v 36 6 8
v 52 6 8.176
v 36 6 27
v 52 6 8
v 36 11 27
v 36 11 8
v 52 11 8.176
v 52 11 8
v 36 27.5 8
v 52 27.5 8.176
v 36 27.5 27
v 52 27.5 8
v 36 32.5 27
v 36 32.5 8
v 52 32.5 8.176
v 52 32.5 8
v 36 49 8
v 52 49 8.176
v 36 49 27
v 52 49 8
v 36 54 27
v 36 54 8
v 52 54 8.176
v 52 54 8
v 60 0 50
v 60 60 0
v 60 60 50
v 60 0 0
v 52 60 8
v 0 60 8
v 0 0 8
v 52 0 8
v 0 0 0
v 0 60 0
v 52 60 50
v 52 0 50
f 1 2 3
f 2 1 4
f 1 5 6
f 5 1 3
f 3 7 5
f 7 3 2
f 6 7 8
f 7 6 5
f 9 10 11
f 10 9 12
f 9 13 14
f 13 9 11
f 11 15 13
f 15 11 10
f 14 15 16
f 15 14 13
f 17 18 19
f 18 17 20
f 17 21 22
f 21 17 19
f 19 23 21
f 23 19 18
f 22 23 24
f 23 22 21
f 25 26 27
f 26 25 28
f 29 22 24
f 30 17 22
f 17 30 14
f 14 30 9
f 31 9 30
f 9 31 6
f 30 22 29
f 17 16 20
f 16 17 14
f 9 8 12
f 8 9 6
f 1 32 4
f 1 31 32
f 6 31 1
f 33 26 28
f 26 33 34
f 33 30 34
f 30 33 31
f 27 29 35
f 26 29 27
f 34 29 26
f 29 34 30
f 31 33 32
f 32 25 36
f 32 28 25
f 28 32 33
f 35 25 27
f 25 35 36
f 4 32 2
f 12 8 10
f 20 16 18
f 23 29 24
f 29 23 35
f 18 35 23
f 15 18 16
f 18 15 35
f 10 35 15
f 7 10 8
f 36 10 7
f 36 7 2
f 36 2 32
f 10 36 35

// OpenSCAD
$fn = 32;

// ----------------------------------------------------------------------
// Rib bracket: 3-gusset L bracket
// ----------------------------------------------------------------------

// --- parameters (mm) ---
base_l = 60;              // foot length, X
base_w = 60;              // foot width, Y
base_t = 8;               // foot thickness
plate_t = 8;              // upright plate thickness
plate_h = 50;             // overall height
gus_l = 16;               // gusset leg along the foot
gus_h = 20;               // gusset height
gus_t = 5;                // gusset thickness
gus_edge = 6;             // gusset margin from the foot edge
n_gus = 3;                // gusset count

gus_pitch = (base_w - 2 * gus_edge - gus_t) / (n_gus - 1);  // gusset pitch

union() {
  cube([base_l, base_w, base_t]);
  translate([base_l - plate_t, 0, base_t - 1])
    cube([plate_t, base_w, plate_h - base_t + 1]);
  for (i = [0 : n_gus - 1])
    translate([base_l - plate_t - gus_l, gus_edge + i * gus_pitch, base_t - 1])
      rotate([-90, 0, 0])
        linear_extrude(height = gus_t)
          polygon(points = [[0, 0], [gus_l + 1, 0], [0, -gus_h]]);
}
